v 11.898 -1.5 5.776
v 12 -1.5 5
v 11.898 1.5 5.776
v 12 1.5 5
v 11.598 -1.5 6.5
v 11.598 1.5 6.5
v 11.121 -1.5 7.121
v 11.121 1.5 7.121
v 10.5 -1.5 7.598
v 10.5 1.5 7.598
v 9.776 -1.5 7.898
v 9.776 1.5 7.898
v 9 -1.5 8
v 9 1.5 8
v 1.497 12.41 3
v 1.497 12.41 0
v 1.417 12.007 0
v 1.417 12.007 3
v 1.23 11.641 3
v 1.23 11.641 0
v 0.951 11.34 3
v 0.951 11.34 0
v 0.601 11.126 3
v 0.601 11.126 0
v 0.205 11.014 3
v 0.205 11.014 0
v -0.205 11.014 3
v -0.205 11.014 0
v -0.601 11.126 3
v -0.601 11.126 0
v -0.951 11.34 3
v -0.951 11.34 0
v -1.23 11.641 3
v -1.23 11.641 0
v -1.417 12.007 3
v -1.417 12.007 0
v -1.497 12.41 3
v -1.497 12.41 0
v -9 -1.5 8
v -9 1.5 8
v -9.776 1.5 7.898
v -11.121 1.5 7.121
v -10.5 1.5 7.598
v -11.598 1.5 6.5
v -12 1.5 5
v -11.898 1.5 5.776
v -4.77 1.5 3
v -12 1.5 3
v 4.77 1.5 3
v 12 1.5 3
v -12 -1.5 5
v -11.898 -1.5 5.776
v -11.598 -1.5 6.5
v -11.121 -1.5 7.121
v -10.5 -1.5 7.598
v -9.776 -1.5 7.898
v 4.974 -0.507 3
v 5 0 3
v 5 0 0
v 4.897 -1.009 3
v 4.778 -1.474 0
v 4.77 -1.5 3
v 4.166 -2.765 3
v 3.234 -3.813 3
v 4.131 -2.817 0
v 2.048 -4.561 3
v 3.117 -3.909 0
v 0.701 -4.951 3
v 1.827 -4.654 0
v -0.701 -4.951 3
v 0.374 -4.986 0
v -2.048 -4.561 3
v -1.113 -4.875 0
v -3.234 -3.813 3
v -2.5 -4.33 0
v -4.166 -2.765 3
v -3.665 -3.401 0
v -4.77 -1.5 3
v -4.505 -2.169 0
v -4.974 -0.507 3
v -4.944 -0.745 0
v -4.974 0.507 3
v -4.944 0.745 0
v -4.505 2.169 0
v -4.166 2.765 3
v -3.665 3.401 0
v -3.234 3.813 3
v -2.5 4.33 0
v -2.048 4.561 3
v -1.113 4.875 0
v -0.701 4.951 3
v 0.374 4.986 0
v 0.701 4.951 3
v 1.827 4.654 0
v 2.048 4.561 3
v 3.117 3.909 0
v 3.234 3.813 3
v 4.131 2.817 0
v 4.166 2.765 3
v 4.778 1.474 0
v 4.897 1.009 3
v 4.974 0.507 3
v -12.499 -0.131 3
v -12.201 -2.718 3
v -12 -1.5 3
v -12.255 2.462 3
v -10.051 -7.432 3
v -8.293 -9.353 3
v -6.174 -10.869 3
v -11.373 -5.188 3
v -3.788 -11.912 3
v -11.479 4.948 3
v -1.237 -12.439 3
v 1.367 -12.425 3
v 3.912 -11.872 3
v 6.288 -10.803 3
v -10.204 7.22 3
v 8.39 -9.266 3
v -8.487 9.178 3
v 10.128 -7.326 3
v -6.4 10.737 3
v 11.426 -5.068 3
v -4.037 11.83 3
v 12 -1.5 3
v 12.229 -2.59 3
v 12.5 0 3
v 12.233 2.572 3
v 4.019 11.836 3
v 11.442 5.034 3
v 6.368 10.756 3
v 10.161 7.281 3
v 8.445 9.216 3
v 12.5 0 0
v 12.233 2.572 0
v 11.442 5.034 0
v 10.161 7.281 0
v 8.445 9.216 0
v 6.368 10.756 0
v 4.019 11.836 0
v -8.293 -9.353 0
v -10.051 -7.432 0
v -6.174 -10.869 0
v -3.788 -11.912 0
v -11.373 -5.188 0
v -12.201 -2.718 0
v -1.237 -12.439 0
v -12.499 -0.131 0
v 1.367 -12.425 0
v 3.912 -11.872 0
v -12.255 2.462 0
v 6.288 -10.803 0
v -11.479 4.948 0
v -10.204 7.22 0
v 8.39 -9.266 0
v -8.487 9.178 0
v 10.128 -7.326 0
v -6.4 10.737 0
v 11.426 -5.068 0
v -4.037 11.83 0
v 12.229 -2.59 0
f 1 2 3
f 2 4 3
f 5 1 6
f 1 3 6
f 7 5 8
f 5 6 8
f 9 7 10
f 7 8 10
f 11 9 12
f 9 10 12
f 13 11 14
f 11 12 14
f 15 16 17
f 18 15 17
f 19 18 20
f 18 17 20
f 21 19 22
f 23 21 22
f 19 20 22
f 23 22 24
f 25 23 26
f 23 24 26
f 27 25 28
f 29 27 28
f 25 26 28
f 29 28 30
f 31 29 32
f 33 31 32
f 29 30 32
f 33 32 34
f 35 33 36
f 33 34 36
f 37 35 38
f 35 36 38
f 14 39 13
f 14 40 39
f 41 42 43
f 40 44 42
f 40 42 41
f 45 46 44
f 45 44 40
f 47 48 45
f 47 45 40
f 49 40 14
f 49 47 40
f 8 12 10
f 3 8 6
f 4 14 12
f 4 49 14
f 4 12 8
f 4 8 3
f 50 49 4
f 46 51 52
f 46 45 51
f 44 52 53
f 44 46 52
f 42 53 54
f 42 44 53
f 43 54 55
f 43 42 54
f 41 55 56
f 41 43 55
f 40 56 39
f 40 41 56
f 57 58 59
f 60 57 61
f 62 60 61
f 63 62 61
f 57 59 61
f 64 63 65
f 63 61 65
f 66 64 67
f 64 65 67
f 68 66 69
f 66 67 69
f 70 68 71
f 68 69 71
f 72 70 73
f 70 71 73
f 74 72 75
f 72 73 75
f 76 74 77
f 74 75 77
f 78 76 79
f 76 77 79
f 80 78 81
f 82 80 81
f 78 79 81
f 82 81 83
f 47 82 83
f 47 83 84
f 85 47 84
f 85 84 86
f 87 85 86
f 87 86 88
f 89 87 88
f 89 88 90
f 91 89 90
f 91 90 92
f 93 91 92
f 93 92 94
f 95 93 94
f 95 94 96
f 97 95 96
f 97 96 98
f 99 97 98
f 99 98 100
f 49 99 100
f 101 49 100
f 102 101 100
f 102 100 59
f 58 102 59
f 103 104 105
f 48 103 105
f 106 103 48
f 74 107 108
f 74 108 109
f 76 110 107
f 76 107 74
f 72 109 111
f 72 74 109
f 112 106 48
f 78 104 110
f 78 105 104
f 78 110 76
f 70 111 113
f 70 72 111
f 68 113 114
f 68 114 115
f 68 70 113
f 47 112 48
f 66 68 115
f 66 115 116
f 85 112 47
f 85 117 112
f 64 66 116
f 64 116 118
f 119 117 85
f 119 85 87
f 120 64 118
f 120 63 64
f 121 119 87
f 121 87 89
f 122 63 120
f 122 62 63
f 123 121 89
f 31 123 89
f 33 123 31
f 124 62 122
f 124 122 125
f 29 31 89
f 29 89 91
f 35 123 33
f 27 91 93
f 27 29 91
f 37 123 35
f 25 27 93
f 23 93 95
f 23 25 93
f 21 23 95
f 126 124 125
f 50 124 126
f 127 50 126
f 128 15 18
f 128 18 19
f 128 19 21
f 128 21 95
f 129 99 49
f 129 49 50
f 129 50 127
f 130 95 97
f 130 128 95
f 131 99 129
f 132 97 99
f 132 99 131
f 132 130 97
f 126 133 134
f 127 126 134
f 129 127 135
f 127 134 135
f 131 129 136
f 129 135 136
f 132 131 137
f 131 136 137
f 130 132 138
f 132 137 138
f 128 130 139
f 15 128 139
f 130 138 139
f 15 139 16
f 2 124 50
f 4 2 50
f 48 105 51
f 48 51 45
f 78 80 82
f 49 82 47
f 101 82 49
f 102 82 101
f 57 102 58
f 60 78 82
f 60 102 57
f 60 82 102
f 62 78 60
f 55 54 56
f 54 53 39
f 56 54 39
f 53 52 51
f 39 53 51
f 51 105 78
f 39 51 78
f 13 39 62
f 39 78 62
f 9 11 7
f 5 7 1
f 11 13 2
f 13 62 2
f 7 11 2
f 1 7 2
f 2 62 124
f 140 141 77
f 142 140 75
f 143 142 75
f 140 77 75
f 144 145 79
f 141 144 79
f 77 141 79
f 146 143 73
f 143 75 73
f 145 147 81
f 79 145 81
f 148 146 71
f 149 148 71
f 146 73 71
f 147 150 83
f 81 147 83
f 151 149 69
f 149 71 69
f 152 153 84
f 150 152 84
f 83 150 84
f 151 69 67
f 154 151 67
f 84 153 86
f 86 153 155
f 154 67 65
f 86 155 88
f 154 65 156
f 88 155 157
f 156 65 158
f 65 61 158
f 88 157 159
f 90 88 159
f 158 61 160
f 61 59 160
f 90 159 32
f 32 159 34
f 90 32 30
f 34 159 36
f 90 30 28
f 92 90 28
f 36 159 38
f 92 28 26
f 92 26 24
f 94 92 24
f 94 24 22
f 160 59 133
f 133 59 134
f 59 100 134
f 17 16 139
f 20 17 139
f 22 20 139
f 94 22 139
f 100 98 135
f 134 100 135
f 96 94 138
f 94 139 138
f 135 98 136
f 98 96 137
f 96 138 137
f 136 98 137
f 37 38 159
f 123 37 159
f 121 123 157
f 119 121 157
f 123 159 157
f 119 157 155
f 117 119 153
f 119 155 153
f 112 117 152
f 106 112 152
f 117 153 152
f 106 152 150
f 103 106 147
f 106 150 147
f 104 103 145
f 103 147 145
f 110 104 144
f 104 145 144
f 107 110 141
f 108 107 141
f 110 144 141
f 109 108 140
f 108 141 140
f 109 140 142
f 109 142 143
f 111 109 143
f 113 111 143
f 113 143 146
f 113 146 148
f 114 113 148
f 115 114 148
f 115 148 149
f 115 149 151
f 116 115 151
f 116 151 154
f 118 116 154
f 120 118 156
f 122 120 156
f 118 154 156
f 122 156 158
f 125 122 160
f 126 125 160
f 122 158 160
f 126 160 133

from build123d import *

# Parameters (mm, degrees)
F1_DEPTH = 3
F2_W     = 24
F2_H     = 3
F3_DEPTH = 5
F4_R     = 5
F5_DEPTH = 3
F6_R     = 3


with BuildPart() as f1:
    # F0 (on Top) → F1 (new body)
    with BuildSketch(Plane.XY):
        with BuildLine():
            ThreePointArc((-1.497298, 12.41), (-8.29258, -9.353241), (12.5, 0))
            ThreePointArc((12.5, 0), (9.353241, 8.29258), (1.497298, 12.41))
            ThreePointArc((1.497298, 12.41), (0, 11), (-1.497298, 12.41))
        make_face()
    extrude(amount=F1_DEPTH)

    # F2 (on face) → F3 (join)
    with BuildSketch(Plane.XY.offset(3)):
        Rectangle(F2_W, F2_H)
    extrude(amount=F3_DEPTH)

    # F4 (on face) → F5 (cut)
    with BuildSketch(Plane(origin=(0, 0, 0), x_dir=(1, 0, 0), z_dir=(0, 0, -1))):
        Circle(F4_R)
    extrude(amount=-F5_DEPTH, mode=Mode.SUBTRACT)

    # F6
    f6_edges = [f1.edges().sort_by_distance(p)[0] for p in [
        (12, 0, 8),
        (-12, 0, 8),
    ]]
    fillet(f6_edges, radius=F6_R)


solid = f1.part
